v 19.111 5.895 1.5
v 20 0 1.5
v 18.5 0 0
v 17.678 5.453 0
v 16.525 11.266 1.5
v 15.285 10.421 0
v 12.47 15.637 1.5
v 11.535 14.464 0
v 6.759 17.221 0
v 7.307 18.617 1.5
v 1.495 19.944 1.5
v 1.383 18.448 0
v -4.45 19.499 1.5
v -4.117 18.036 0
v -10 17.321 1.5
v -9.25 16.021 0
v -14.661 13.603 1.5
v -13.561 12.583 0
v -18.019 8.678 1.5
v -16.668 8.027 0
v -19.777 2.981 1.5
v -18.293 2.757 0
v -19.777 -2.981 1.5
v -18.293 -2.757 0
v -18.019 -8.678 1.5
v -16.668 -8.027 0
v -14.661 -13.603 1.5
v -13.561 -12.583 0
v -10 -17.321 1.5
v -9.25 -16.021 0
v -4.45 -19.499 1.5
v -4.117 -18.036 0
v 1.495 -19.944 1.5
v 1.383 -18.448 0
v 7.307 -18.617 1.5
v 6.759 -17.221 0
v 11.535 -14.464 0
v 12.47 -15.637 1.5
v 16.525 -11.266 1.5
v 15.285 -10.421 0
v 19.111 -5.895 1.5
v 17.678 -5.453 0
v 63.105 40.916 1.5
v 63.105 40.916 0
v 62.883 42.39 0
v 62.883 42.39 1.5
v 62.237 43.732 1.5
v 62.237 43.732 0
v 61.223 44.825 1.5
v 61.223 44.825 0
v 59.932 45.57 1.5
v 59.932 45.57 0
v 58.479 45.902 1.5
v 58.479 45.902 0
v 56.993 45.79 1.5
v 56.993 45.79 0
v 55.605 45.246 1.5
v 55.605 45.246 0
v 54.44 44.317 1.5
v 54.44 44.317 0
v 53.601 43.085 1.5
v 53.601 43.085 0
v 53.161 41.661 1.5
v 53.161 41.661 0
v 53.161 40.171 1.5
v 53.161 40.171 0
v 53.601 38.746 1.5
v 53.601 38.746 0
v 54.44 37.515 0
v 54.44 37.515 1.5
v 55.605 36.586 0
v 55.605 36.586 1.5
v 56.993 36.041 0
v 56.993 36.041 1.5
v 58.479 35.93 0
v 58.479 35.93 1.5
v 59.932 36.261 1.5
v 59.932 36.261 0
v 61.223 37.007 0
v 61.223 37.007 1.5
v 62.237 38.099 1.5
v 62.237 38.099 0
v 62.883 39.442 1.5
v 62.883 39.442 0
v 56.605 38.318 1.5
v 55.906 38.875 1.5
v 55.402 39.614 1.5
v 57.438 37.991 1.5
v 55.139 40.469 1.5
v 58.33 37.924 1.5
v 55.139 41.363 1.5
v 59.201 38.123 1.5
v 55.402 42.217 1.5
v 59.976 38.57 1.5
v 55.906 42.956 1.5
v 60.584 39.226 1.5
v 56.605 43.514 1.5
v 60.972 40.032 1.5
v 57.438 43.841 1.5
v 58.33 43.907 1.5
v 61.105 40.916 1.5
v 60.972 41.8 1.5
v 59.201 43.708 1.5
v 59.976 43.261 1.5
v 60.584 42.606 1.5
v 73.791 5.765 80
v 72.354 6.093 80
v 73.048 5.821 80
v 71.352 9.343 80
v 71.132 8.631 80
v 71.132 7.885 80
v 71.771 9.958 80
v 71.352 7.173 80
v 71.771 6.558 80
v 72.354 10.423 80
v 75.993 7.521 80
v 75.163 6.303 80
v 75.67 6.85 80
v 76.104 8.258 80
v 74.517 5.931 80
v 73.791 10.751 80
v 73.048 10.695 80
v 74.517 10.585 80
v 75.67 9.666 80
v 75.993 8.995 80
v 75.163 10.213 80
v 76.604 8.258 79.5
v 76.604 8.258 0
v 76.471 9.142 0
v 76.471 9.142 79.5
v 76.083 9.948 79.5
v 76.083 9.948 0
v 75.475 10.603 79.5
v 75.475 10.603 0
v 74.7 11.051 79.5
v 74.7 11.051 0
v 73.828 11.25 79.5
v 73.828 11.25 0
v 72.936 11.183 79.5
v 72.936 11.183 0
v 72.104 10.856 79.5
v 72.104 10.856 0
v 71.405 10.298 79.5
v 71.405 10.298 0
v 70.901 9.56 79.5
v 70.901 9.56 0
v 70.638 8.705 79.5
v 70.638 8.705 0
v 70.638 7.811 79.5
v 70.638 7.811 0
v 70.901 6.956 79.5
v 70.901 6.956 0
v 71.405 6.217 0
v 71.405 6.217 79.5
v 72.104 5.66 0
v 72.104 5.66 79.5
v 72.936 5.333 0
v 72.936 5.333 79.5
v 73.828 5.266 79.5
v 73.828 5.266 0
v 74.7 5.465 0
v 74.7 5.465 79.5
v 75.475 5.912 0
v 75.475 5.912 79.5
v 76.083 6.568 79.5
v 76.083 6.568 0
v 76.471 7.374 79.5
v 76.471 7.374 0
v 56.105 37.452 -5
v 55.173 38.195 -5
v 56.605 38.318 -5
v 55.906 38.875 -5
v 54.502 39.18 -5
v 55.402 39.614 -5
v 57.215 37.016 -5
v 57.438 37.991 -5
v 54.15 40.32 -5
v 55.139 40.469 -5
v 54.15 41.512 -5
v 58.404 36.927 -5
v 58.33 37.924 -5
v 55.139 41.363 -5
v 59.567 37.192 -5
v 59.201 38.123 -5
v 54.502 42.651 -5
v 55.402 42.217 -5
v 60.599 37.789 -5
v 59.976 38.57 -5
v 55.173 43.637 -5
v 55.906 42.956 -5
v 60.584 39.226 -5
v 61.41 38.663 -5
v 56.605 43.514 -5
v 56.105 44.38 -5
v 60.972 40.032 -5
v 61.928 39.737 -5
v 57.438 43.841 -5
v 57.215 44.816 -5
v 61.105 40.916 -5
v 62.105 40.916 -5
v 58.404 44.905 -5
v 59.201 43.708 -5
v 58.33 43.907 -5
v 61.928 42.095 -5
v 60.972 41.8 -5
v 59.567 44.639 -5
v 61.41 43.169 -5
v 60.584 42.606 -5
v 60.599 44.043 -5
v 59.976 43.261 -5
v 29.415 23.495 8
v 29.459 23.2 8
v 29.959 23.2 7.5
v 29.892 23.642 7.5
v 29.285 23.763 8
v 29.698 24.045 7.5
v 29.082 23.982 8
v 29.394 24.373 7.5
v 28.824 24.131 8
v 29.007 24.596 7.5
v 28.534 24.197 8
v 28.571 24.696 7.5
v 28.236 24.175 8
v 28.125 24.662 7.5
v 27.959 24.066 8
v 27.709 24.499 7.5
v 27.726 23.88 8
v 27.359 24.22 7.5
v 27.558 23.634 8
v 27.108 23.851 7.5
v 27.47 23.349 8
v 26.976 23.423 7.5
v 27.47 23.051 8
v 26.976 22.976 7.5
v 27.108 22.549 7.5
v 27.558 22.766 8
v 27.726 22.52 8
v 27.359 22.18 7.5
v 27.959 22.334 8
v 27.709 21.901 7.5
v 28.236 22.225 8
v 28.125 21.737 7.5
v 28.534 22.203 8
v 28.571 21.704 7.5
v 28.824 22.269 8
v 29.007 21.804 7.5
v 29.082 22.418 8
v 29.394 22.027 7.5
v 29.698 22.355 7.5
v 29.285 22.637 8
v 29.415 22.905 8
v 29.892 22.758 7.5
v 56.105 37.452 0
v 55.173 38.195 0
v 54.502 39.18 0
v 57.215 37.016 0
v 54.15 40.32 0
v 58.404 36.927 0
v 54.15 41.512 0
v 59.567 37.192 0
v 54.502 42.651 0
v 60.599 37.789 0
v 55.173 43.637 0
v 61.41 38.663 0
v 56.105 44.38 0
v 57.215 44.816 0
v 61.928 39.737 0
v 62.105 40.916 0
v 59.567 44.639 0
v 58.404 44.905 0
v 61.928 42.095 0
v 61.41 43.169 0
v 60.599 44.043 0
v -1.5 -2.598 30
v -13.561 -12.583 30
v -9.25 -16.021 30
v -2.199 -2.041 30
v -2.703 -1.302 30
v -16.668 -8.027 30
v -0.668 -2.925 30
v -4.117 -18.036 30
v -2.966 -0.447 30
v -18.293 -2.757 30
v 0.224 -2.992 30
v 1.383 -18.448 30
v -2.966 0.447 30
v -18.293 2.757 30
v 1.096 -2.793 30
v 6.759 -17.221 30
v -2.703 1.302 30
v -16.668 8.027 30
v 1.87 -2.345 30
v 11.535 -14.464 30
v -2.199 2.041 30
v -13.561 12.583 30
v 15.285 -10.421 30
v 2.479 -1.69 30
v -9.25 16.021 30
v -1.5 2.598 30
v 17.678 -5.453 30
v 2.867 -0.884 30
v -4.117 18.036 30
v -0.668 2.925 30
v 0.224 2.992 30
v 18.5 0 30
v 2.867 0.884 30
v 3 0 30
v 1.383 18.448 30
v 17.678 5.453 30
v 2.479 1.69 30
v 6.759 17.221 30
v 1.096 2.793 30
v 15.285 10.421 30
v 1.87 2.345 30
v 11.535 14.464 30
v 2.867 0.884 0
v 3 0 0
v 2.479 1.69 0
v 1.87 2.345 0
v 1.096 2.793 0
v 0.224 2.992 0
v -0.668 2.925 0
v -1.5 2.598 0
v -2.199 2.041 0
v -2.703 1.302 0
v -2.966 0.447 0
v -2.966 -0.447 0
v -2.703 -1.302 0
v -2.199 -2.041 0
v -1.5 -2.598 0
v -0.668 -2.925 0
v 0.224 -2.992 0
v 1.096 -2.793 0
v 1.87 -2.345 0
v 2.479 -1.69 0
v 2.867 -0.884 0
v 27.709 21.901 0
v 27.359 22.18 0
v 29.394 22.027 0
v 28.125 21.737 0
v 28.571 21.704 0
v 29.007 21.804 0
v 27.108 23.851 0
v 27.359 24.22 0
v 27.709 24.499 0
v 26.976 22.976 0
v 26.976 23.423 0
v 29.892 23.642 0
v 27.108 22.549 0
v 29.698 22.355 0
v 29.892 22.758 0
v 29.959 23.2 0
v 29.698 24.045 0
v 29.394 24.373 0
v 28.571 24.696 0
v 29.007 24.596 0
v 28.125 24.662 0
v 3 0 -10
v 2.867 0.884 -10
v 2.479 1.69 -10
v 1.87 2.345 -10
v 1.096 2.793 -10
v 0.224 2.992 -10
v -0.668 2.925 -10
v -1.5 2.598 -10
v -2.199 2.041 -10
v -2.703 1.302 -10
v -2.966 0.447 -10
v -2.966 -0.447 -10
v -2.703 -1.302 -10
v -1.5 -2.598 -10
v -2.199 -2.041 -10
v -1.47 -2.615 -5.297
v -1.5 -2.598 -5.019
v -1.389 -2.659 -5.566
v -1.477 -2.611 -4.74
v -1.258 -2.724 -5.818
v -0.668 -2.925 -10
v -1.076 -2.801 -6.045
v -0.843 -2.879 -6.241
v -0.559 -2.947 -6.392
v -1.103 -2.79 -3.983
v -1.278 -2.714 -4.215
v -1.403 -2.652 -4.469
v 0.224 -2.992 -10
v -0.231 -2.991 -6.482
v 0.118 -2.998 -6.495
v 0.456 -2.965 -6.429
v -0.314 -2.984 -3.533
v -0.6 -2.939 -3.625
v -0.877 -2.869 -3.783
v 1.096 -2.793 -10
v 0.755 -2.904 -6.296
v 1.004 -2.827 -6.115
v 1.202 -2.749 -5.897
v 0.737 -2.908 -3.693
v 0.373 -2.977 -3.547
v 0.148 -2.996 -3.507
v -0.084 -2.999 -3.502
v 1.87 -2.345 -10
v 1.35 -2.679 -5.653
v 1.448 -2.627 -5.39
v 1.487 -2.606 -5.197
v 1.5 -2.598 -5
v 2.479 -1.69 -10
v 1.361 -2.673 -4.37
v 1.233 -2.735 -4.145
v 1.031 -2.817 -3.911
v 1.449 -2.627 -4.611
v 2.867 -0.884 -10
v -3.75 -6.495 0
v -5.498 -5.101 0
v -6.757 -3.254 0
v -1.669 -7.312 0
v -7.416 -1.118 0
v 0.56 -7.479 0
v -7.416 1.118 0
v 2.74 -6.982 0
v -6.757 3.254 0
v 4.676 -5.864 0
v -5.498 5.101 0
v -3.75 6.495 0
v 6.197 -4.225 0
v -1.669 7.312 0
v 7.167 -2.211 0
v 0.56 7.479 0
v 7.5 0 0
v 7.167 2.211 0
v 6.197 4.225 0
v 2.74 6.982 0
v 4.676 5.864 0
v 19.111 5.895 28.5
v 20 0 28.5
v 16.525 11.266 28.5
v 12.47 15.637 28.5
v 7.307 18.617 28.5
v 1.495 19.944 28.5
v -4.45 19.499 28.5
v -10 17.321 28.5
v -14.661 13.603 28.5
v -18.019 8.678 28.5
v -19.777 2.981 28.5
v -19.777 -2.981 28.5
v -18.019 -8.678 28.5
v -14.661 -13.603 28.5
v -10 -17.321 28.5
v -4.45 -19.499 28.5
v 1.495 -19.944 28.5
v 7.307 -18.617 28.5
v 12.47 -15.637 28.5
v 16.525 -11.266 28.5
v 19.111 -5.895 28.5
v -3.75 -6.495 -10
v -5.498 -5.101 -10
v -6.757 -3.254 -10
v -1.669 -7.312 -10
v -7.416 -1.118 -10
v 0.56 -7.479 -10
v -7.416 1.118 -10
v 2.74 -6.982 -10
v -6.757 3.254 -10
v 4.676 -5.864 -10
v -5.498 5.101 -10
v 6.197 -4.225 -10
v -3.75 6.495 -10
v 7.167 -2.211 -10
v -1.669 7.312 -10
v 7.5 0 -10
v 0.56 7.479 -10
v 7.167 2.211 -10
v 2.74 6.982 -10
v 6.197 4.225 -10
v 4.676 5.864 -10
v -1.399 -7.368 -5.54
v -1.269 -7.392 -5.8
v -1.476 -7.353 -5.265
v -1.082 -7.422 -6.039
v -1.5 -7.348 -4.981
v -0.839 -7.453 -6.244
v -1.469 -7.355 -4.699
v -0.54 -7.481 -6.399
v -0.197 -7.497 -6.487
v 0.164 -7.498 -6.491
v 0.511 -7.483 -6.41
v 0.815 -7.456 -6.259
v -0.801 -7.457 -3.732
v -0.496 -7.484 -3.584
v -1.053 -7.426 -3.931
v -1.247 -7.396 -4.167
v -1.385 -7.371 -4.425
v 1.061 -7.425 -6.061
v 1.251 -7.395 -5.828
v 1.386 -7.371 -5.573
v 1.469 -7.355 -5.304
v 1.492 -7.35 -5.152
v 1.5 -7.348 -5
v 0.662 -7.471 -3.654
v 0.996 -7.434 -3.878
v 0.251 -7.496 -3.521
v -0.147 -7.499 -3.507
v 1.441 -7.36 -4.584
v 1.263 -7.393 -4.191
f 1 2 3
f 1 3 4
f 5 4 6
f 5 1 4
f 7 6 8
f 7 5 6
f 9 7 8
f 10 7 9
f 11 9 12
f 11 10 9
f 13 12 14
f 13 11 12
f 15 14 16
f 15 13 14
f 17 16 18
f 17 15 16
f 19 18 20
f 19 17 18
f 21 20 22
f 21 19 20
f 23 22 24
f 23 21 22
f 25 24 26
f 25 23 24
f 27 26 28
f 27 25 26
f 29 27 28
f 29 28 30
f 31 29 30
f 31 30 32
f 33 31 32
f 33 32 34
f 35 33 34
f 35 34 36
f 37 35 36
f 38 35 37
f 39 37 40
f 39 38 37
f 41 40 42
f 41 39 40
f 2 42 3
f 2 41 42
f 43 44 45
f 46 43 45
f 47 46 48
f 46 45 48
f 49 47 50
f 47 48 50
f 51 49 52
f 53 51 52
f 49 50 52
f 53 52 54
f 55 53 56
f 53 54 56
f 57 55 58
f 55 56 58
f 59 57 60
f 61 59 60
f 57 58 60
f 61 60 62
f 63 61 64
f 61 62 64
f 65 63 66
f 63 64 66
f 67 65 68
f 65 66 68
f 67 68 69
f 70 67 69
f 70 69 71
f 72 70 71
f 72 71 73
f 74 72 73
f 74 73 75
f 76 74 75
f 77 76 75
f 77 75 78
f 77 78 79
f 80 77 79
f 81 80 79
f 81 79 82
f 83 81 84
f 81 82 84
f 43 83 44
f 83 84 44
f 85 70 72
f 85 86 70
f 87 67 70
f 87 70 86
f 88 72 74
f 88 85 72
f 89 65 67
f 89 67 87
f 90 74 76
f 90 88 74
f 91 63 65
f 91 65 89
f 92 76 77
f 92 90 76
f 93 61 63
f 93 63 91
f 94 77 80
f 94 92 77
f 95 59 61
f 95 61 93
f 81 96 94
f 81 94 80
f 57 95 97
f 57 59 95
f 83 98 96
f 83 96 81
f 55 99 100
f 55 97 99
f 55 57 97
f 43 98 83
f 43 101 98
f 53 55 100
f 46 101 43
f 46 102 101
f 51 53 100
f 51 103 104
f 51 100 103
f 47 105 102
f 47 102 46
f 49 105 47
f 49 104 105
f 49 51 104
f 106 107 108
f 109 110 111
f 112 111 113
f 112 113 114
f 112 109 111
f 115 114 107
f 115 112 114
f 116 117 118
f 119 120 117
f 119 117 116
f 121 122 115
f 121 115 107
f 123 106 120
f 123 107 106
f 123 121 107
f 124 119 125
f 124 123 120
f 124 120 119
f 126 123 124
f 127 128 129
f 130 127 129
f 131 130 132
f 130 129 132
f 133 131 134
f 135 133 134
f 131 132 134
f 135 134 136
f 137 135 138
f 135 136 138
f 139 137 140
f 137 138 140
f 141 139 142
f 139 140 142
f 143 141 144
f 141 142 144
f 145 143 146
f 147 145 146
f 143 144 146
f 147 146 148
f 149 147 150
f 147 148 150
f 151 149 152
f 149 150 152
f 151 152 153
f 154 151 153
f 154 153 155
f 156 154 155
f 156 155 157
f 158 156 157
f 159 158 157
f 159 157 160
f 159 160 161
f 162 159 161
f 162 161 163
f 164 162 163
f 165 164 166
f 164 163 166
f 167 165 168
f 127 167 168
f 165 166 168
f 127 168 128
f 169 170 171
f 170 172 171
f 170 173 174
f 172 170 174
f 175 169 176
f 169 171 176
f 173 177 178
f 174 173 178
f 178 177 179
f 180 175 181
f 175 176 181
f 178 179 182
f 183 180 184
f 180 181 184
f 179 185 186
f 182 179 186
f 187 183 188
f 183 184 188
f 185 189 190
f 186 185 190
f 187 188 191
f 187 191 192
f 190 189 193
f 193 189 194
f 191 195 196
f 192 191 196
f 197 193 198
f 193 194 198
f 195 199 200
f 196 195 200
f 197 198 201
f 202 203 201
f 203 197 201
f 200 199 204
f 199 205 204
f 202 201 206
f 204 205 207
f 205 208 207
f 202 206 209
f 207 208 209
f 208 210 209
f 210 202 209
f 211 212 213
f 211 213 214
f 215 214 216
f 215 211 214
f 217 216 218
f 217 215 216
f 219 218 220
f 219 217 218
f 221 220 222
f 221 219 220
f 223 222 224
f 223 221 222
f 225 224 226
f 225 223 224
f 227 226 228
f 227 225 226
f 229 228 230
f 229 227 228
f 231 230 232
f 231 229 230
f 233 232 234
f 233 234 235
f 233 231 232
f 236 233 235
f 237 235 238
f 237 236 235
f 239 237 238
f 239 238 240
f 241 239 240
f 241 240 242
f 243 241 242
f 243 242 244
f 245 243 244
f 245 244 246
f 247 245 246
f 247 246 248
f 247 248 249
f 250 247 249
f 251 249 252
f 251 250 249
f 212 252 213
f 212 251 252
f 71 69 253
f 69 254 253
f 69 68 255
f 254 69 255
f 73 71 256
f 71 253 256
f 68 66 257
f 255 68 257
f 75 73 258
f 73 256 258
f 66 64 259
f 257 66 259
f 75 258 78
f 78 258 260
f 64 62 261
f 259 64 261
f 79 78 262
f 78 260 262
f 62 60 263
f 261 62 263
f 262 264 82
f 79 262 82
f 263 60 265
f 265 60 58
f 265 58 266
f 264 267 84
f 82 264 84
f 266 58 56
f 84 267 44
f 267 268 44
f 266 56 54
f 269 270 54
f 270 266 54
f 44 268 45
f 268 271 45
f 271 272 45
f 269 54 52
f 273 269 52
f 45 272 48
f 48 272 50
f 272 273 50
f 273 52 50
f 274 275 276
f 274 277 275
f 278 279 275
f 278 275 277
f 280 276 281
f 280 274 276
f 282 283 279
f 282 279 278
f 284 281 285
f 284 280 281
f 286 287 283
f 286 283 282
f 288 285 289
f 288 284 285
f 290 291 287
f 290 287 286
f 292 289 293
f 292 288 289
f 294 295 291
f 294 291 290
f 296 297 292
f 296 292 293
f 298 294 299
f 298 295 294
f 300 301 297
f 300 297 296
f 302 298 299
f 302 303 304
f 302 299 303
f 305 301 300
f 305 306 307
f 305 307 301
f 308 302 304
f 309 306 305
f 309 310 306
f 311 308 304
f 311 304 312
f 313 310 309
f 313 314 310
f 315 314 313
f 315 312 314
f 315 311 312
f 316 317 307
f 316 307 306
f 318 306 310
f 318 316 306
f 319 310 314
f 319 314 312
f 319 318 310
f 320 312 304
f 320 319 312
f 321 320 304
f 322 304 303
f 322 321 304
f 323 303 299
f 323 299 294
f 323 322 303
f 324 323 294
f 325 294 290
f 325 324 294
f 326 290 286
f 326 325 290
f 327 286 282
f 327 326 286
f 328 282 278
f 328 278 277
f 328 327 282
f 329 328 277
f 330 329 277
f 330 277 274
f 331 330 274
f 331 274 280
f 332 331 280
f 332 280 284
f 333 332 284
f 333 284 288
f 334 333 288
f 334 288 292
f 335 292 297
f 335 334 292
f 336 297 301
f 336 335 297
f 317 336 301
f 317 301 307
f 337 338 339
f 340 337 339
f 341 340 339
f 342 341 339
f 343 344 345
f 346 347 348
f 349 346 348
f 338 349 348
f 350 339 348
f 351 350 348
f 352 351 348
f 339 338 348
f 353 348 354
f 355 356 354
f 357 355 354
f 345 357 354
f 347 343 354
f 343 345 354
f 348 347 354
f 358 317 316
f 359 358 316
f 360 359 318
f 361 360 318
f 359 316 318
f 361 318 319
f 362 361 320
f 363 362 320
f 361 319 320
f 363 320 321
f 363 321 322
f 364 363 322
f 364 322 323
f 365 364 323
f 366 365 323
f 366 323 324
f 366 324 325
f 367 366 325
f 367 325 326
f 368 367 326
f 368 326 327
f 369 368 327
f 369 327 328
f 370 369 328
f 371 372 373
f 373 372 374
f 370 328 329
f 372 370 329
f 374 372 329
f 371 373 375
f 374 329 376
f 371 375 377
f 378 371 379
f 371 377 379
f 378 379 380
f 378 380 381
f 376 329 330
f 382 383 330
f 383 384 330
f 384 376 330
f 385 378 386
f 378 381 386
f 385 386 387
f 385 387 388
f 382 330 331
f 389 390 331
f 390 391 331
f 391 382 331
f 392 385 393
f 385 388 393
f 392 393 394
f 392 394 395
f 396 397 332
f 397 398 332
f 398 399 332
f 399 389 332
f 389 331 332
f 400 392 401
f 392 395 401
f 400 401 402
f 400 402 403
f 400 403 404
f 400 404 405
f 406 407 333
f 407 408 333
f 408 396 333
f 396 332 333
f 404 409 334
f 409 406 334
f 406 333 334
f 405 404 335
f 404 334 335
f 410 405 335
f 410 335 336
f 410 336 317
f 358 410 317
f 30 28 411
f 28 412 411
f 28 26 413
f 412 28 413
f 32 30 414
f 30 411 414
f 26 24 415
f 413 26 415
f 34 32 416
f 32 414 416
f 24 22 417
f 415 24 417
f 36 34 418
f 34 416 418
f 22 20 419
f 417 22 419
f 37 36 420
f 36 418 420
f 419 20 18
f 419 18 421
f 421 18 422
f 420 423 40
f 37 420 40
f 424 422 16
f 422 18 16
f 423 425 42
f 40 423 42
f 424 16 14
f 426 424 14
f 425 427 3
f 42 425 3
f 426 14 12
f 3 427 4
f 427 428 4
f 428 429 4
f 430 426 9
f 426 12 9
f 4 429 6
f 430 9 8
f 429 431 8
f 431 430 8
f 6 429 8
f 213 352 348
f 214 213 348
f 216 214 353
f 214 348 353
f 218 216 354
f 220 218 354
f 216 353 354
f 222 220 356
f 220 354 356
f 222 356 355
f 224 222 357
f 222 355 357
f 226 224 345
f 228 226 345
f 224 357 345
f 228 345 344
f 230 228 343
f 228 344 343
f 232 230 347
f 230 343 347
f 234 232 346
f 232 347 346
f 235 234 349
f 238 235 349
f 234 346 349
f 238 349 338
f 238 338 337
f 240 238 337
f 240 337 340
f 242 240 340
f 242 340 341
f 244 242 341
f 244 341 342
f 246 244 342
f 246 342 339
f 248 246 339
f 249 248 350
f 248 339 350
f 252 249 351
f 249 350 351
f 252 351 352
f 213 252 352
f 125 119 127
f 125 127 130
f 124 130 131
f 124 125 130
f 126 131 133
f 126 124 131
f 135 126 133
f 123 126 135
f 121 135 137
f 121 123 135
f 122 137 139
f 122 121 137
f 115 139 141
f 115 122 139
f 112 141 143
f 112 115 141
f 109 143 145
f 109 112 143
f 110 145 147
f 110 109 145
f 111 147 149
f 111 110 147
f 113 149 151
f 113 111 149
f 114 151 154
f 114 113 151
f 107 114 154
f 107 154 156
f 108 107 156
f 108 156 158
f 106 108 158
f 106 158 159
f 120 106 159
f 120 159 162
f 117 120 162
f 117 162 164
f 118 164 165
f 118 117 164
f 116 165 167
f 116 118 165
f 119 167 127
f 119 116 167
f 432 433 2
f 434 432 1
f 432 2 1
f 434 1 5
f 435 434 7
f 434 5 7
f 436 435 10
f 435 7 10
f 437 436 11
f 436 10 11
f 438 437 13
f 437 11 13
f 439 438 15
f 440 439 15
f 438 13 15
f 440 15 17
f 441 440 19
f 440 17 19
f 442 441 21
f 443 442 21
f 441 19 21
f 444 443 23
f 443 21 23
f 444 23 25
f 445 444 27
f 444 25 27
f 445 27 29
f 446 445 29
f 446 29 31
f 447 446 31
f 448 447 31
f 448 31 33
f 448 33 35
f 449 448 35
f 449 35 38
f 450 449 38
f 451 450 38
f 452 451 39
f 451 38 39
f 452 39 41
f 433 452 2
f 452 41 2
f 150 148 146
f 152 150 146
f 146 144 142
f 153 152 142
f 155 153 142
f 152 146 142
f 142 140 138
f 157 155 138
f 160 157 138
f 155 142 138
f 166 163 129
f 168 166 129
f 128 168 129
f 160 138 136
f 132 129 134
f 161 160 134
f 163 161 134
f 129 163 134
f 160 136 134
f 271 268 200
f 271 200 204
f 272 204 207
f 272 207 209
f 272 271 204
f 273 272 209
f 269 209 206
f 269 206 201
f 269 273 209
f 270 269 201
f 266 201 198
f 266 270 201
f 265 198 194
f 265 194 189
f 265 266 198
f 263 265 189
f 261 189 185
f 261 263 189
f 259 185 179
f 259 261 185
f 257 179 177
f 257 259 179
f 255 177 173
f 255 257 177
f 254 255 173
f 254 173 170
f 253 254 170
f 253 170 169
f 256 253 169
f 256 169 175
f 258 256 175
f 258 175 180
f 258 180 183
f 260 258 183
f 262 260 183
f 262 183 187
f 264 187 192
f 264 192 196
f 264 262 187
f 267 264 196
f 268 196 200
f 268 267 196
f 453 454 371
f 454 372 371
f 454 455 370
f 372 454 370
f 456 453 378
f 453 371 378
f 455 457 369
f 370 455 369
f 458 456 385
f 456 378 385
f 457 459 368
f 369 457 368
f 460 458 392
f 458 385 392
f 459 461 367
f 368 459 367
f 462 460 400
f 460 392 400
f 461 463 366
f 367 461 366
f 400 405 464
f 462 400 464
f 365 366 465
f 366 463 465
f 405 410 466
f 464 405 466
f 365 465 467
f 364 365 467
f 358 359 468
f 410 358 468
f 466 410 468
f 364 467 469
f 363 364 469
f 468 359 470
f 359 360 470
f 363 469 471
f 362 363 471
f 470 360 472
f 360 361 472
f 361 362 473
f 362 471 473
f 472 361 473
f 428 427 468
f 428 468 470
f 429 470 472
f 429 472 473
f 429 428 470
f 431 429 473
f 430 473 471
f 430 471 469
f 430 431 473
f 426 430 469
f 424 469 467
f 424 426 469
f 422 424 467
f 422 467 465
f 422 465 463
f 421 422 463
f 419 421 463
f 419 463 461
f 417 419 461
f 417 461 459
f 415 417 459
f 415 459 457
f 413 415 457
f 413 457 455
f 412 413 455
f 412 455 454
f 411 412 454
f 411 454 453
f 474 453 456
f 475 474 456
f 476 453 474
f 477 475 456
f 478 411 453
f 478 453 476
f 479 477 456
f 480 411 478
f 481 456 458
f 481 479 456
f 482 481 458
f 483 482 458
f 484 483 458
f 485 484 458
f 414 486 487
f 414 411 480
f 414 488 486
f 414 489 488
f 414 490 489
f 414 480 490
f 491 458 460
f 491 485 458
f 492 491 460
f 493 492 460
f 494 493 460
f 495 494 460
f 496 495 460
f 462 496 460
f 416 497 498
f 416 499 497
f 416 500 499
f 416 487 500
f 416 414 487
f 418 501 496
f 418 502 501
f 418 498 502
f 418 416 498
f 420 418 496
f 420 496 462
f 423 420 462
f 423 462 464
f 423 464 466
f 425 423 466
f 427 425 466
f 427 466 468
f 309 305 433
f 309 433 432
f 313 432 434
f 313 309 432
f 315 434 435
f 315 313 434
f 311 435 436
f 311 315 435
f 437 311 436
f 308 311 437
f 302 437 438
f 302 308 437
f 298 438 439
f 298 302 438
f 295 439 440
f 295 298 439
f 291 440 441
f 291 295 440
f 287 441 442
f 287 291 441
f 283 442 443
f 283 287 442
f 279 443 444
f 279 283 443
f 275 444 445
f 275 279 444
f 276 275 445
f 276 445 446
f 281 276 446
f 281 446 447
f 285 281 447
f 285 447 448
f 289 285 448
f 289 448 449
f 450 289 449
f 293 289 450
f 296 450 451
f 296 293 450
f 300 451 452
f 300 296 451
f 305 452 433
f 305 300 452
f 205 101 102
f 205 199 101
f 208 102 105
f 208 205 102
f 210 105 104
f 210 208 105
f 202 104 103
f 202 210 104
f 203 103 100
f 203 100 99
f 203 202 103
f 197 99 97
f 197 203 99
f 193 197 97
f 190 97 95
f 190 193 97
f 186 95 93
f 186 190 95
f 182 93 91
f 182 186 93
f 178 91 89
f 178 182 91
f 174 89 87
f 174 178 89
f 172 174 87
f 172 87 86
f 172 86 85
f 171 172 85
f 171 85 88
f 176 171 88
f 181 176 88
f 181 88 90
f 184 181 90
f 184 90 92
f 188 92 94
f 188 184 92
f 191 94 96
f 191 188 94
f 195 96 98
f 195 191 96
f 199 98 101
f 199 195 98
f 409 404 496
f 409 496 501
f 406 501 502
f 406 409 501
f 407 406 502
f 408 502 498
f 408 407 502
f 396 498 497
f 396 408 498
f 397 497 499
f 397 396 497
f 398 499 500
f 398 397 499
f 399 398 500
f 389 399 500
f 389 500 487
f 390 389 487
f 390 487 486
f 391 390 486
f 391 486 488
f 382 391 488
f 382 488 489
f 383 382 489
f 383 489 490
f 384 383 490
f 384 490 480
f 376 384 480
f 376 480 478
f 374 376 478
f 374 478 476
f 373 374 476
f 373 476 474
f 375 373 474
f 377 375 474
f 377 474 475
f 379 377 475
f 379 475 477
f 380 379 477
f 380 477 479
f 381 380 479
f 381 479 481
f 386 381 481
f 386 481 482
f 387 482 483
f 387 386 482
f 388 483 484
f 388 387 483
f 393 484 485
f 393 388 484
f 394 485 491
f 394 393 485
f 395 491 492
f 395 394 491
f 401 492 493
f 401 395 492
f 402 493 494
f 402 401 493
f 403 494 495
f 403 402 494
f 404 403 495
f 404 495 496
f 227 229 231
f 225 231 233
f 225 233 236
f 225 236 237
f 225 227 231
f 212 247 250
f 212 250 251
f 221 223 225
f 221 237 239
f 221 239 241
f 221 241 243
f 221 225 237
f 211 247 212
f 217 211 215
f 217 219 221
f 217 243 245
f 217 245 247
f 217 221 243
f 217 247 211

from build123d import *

# Parameters (mm, degrees)
F0_R      = 20
F0_R_2    = 7.5
F0_R_3    = 3
F1_DEPTH  = 30
F2_DEPTH  = 10
F3_SIZE   = 1.5
F4_R      = 1.5
F5_DEPTH  = 8.5000001262
F6_DEPTH  = 80
F7_SIZE   = 0.5
F0_R_4    = 4
F8_DEPTH  = 5
F0_R_5    = 5
F9_DEPTH  = 1.5
F0_R_6    = 1.5
F10_DEPTH = 8
F11_SIZE  = 0.5


with BuildPart() as f1:
    # F0 (on Top) → F1 (new body)
    with BuildSketch(Plane.XY):
        Circle(F0_R)
        Circle(F0_R_2, mode=Mode.SUBTRACT)
        Circle(F0_R_2)
        Circle(F0_R_3, mode=Mode.SUBTRACT)
    extrude(amount=F1_DEPTH)

    # F0 (on Top) → F2 (join)
    with BuildSketch(Plane.XY):
        Circle(F0_R_2)
        Circle(F0_R_3, mode=Mode.SUBTRACT)
    extrude(amount=-F2_DEPTH)

    # F3
    f3_edges = [f1.edges().sort_by_distance(p)[0] for p in [
        (-20, 0, 30),
        (-20, 0, 0),
    ]]
    chamfer(f3_edges, length=F3_SIZE)

    # F4 (on Front) → F5 (cut, up to face)
    with BuildSketch(Plane.XZ):
        with Locations((0, -5)):
            Circle(F4_R)
    extrude(amount=F5_DEPTH, mode=Mode.SUBTRACT)


with BuildPart() as f6:
    # F0 (on Top) → F6 (new body)
    with BuildSketch(Plane.XY):
        with Locations((73.6040472984, 8.2579720765)):
            Circle(F0_R_3)
    extrude(amount=F6_DEPTH)

    # F7
    f7_edges = [f6.edges().sort_by_distance(p)[0] for p in [
        (70.604047, 8.257972, 80),
    ]]
    chamfer(f7_edges, length=F7_SIZE)


with BuildPart() as f8:
    # F0 (on Top) → F8 (new body)
    with BuildSketch(Plane.XY):
        with Locations((58.1053979695, 40.9158319235)):
            Circle(F0_R_4)
        with Locations((58.1053979695, 40.9158319235)):
            Circle(F0_R_3, mode=Mode.SUBTRACT)
    extrude(amount=-F8_DEPTH)

    # F0 (on Top) → F9 (join)
    with BuildSketch(Plane.XY):
        with Locations((58.1053979695, 40.9158319235)):
            Circle(F0_R_5)
        with Locations((58.1053979695, 40.9158319235)):
            Circle(F0_R_4, mode=Mode.SUBTRACT)
        with Locations((58.1053979695, 40.9158319235)):
            Circle(F0_R_4)
        with Locations((58.1053979695, 40.9158319235)):
            Circle(F0_R_3, mode=Mode.SUBTRACT)
    extrude(amount=F9_DEPTH)


with BuildPart() as f10:
    # F0 (on Top) → F10 (new body)
    with BuildSketch(Plane.XY):
        with Locations((28.4589827061, 23.1998879462)):
            Circle(F0_R_6)
    extrude(amount=F10_DEPTH)

    # F11
    f11_edges = [f10.edges().sort_by_distance(p)[0] for p in [
        (26.958983, 23.199888, 8),
    ]]
    chamfer(f11_edges, length=F11_SIZE)


solid = Compound([f1.part, f6.part, f8.part, f10.part])
